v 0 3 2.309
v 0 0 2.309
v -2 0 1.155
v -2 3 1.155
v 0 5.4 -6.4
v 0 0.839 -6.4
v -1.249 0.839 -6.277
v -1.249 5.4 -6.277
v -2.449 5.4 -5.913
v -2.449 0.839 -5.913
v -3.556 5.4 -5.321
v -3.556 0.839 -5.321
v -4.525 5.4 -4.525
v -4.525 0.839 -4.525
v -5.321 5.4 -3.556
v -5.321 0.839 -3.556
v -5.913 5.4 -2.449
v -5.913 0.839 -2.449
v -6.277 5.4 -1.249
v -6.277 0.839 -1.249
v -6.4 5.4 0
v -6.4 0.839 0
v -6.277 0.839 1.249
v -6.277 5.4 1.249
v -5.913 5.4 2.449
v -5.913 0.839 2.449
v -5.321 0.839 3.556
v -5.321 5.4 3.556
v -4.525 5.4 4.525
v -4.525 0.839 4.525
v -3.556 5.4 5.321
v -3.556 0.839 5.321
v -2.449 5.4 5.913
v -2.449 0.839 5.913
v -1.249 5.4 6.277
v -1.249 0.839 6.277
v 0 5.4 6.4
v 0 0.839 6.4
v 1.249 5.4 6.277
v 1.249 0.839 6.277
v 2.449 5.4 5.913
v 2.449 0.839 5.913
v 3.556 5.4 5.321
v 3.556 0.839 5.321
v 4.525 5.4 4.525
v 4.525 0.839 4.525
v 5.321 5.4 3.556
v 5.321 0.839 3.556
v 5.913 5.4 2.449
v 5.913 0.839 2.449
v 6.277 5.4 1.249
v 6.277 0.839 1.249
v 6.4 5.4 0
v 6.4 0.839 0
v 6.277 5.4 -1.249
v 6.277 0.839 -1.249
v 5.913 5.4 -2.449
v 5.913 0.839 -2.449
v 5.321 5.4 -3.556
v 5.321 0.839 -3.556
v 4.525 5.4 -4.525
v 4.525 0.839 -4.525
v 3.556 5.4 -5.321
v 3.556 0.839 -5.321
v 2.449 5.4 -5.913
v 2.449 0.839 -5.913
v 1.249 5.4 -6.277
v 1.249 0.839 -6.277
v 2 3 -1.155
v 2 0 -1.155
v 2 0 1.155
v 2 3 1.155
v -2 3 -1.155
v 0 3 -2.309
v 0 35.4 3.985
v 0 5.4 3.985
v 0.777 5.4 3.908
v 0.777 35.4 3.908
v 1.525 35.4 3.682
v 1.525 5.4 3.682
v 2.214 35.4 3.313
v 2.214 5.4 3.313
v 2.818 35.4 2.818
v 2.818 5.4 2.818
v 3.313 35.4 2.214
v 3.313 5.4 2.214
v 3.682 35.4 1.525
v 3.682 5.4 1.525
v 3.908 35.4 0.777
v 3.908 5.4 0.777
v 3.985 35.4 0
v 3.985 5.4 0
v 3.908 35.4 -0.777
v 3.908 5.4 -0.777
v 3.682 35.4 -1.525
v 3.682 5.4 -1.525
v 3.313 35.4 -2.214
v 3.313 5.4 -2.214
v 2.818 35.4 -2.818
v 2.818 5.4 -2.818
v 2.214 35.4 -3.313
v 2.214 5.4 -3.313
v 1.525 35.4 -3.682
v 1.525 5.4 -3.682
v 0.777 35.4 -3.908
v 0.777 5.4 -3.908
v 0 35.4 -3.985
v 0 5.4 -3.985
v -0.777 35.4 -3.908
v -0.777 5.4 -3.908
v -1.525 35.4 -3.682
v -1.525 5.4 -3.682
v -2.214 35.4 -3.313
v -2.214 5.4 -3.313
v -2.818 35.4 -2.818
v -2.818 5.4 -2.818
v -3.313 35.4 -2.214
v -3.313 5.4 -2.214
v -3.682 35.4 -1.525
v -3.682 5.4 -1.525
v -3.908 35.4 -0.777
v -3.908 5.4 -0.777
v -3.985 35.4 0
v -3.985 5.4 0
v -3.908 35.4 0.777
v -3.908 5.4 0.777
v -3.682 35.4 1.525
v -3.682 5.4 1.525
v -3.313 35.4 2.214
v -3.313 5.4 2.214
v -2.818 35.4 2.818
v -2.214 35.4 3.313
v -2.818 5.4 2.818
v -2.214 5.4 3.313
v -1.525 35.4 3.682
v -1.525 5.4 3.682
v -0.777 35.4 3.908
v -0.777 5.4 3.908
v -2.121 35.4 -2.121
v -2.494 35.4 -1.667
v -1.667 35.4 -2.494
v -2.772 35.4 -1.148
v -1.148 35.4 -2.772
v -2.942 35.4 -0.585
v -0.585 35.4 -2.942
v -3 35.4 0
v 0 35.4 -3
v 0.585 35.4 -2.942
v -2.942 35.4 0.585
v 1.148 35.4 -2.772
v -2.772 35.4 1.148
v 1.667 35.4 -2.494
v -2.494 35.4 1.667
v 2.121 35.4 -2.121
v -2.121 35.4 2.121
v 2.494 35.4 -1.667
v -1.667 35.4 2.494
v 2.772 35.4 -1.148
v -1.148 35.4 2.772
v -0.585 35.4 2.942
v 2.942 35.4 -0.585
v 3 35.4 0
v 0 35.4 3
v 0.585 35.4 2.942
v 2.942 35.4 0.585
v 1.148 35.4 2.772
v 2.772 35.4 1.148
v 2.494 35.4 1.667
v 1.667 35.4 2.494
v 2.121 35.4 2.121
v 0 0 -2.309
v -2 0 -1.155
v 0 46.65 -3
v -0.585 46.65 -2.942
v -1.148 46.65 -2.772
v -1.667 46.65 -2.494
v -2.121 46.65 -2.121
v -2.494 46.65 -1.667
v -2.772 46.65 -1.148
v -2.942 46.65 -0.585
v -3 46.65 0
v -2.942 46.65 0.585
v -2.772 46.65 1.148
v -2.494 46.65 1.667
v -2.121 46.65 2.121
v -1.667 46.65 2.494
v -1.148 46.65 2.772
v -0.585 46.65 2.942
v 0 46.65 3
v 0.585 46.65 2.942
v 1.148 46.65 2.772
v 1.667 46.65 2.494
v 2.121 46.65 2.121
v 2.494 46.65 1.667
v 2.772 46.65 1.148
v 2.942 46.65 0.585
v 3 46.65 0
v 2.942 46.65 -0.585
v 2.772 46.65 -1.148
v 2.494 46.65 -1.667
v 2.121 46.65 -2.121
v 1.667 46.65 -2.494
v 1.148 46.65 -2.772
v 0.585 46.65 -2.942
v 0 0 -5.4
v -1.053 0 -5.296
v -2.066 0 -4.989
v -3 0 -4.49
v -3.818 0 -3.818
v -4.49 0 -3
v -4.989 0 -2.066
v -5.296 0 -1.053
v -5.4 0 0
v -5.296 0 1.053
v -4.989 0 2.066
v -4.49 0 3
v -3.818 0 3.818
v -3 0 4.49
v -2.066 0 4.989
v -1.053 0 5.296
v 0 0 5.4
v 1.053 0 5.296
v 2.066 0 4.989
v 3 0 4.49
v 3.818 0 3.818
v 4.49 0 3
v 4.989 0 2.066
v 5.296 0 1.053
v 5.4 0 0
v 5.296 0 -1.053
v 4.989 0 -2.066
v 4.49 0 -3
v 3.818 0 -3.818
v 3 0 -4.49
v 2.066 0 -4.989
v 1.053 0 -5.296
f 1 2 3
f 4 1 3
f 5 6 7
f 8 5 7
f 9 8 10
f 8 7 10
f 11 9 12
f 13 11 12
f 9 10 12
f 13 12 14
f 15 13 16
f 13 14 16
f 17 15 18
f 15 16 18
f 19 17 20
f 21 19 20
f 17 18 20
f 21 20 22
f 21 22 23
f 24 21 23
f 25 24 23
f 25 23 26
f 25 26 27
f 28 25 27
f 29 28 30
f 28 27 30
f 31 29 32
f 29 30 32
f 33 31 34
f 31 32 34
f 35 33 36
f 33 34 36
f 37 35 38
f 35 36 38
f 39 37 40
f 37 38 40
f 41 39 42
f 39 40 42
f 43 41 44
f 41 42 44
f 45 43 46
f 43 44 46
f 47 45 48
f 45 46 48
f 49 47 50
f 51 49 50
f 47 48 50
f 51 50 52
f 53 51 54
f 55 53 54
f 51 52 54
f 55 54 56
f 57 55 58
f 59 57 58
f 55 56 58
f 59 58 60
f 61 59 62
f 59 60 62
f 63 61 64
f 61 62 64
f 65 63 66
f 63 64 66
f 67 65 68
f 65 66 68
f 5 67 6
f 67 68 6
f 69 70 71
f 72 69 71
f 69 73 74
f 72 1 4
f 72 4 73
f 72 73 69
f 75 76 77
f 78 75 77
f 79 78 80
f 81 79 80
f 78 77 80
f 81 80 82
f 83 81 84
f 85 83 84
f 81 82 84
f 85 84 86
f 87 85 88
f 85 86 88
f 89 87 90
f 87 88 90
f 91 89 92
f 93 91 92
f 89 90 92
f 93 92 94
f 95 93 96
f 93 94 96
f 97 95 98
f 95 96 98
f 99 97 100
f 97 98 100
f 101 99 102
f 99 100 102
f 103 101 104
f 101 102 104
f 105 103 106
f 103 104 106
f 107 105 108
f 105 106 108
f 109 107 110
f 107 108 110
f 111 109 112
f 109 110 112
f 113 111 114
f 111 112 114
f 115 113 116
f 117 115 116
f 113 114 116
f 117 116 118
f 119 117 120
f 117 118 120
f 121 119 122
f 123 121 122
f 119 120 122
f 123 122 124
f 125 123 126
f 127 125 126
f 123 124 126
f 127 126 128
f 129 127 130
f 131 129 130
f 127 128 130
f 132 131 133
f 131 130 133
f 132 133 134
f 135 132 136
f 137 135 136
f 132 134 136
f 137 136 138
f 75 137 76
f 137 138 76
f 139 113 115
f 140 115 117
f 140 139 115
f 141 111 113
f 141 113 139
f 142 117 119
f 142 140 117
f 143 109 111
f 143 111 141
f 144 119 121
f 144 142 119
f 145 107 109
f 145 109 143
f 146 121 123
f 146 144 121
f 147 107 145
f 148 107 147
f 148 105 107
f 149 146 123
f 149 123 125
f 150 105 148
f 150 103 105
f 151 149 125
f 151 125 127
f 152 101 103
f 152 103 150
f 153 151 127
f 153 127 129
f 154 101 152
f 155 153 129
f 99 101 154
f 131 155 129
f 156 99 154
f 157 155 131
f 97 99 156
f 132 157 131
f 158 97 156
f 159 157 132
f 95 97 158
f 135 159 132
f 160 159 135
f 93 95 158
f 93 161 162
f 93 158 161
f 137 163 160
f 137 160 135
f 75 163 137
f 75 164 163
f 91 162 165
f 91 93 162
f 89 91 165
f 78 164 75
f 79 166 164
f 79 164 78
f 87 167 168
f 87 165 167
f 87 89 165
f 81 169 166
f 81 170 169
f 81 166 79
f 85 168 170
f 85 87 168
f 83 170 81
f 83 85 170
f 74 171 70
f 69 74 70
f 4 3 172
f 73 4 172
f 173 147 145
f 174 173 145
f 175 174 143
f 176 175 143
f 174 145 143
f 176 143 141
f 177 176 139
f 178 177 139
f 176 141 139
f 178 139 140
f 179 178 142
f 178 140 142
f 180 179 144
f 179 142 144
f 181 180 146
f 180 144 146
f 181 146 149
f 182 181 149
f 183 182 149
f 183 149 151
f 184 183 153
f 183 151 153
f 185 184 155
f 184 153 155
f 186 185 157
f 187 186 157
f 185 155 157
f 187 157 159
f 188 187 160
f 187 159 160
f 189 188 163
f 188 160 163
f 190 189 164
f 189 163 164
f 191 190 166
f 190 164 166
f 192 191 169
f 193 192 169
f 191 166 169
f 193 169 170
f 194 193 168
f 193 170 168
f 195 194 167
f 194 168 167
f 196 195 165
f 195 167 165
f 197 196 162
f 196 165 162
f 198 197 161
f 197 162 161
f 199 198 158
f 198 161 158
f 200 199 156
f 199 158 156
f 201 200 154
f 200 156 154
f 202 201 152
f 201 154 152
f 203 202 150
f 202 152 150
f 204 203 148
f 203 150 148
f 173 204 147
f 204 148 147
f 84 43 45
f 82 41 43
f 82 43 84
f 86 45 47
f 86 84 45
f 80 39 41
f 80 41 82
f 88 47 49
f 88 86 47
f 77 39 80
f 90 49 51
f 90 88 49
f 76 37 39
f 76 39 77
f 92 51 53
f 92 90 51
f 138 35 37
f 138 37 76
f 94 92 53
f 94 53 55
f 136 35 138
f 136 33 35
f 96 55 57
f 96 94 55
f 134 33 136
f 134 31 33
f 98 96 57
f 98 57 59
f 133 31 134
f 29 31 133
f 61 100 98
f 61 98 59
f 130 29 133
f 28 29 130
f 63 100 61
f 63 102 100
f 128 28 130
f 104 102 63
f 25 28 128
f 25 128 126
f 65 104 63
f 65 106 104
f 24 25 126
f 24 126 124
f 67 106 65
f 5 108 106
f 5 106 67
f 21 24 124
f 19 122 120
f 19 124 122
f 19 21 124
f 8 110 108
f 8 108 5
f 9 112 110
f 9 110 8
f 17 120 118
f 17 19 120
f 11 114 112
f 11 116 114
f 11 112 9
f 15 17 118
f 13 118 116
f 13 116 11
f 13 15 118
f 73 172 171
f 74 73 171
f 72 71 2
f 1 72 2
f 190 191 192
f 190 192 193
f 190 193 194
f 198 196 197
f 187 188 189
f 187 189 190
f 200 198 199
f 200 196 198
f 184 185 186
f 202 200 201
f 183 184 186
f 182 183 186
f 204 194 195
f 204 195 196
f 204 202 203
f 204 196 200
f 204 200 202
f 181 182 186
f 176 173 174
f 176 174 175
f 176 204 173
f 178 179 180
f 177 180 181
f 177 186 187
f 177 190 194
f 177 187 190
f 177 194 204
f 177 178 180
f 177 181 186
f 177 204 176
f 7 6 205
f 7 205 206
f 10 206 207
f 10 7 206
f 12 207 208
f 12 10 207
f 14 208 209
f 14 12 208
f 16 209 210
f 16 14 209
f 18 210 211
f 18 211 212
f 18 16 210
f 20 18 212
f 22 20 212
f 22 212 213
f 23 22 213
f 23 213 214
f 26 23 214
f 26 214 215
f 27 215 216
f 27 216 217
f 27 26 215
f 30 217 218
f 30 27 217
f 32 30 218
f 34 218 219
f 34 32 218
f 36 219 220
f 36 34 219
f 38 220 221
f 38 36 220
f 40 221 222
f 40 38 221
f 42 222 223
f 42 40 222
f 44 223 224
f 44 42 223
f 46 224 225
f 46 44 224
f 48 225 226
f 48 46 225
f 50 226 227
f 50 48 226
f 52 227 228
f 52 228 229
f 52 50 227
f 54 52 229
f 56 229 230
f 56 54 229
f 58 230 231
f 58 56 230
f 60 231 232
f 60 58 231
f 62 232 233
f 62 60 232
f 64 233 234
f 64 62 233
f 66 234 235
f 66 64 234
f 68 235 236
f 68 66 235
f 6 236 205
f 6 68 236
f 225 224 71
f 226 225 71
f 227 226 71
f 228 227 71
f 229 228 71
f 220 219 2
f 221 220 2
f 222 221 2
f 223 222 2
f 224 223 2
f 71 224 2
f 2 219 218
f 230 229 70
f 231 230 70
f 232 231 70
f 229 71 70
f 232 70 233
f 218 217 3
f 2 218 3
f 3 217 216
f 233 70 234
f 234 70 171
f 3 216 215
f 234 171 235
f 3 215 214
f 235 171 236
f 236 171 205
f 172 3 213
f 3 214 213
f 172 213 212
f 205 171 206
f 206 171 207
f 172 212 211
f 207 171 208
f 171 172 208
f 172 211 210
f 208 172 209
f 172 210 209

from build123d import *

# Parameters (mm, degrees)
SKETCH_1_R          = 6.4
EXTRUDE_1_DEPTH     = 5.4
SKETCH_2_R          = 3.985
EXTRUDE_2_DEPTH     = 30
SKETCH_3_R          = 3
EXTRUDE_3_DEPTH     = 11.25
CHAMFER_1_SIZE      = 1
CHAMFER_1_SIZE2     = 0.839099631
CUT_EXTRUDE_1_DEPTH = 3


with BuildPart() as part:
    # 草图1 → 凸台-拉伸1 (new body)
    with BuildSketch(Plane(origin=(0, 0, 0), x_dir=(1, 0, 0), z_dir=(0, 1, 0))):
        with Locations(Location((0, 0, 0), (0, 0, 90))):
            Circle(SKETCH_1_R)
    extrude(amount=EXTRUDE_1_DEPTH)

    # 草图2 → 凸台-拉伸2 (add)
    with BuildSketch(Plane(origin=(0, 5.4, 0), x_dir=(1, 0, 0), z_dir=(0, 1, 0))):
        with Locations(Location((0, 0, 0), (0, 0, 270))):
            Circle(SKETCH_2_R)
    extrude(amount=EXTRUDE_2_DEPTH)

    # 草图3 → 凸台-拉伸3 (add)
    with BuildSketch(Plane(origin=(0, 35.4, 0), x_dir=(1, 0, 0), z_dir=(0, 1, 0))):
        with Locations(Location((0, 0, 0), (0, 0, 90))):
            Circle(SKETCH_3_R)
    extrude(amount=EXTRUDE_3_DEPTH)

    # 倒角1
    chamfer_1_edges = [part.edges().sort_by_distance(p)[0] for p in [
        (0, 0, 6.4),
    ]]
    chamfer_1_side = [part.faces().sort_by_distance(p)[0] for p in [
        (0, 0, 0),
    ]]
    chamfer(chamfer_1_edges, length=CHAMFER_1_SIZE, length2=CHAMFER_1_SIZE2, reference=chamfer_1_side[0])

    # 草图4 → 切除-拉伸1 (cut)
    with BuildSketch(Plane.XZ):
        Polygon((0, 2.309401077), (-2, 1.154700538), (-2, -1.154700538), (0, -2.309401077), (2, -1.154700538), (2, 1.154700538), align=None)
    extrude(amount=-CUT_EXTRUDE_1_DEPTH, mode=Mode.SUBTRACT)


solid = part.part
